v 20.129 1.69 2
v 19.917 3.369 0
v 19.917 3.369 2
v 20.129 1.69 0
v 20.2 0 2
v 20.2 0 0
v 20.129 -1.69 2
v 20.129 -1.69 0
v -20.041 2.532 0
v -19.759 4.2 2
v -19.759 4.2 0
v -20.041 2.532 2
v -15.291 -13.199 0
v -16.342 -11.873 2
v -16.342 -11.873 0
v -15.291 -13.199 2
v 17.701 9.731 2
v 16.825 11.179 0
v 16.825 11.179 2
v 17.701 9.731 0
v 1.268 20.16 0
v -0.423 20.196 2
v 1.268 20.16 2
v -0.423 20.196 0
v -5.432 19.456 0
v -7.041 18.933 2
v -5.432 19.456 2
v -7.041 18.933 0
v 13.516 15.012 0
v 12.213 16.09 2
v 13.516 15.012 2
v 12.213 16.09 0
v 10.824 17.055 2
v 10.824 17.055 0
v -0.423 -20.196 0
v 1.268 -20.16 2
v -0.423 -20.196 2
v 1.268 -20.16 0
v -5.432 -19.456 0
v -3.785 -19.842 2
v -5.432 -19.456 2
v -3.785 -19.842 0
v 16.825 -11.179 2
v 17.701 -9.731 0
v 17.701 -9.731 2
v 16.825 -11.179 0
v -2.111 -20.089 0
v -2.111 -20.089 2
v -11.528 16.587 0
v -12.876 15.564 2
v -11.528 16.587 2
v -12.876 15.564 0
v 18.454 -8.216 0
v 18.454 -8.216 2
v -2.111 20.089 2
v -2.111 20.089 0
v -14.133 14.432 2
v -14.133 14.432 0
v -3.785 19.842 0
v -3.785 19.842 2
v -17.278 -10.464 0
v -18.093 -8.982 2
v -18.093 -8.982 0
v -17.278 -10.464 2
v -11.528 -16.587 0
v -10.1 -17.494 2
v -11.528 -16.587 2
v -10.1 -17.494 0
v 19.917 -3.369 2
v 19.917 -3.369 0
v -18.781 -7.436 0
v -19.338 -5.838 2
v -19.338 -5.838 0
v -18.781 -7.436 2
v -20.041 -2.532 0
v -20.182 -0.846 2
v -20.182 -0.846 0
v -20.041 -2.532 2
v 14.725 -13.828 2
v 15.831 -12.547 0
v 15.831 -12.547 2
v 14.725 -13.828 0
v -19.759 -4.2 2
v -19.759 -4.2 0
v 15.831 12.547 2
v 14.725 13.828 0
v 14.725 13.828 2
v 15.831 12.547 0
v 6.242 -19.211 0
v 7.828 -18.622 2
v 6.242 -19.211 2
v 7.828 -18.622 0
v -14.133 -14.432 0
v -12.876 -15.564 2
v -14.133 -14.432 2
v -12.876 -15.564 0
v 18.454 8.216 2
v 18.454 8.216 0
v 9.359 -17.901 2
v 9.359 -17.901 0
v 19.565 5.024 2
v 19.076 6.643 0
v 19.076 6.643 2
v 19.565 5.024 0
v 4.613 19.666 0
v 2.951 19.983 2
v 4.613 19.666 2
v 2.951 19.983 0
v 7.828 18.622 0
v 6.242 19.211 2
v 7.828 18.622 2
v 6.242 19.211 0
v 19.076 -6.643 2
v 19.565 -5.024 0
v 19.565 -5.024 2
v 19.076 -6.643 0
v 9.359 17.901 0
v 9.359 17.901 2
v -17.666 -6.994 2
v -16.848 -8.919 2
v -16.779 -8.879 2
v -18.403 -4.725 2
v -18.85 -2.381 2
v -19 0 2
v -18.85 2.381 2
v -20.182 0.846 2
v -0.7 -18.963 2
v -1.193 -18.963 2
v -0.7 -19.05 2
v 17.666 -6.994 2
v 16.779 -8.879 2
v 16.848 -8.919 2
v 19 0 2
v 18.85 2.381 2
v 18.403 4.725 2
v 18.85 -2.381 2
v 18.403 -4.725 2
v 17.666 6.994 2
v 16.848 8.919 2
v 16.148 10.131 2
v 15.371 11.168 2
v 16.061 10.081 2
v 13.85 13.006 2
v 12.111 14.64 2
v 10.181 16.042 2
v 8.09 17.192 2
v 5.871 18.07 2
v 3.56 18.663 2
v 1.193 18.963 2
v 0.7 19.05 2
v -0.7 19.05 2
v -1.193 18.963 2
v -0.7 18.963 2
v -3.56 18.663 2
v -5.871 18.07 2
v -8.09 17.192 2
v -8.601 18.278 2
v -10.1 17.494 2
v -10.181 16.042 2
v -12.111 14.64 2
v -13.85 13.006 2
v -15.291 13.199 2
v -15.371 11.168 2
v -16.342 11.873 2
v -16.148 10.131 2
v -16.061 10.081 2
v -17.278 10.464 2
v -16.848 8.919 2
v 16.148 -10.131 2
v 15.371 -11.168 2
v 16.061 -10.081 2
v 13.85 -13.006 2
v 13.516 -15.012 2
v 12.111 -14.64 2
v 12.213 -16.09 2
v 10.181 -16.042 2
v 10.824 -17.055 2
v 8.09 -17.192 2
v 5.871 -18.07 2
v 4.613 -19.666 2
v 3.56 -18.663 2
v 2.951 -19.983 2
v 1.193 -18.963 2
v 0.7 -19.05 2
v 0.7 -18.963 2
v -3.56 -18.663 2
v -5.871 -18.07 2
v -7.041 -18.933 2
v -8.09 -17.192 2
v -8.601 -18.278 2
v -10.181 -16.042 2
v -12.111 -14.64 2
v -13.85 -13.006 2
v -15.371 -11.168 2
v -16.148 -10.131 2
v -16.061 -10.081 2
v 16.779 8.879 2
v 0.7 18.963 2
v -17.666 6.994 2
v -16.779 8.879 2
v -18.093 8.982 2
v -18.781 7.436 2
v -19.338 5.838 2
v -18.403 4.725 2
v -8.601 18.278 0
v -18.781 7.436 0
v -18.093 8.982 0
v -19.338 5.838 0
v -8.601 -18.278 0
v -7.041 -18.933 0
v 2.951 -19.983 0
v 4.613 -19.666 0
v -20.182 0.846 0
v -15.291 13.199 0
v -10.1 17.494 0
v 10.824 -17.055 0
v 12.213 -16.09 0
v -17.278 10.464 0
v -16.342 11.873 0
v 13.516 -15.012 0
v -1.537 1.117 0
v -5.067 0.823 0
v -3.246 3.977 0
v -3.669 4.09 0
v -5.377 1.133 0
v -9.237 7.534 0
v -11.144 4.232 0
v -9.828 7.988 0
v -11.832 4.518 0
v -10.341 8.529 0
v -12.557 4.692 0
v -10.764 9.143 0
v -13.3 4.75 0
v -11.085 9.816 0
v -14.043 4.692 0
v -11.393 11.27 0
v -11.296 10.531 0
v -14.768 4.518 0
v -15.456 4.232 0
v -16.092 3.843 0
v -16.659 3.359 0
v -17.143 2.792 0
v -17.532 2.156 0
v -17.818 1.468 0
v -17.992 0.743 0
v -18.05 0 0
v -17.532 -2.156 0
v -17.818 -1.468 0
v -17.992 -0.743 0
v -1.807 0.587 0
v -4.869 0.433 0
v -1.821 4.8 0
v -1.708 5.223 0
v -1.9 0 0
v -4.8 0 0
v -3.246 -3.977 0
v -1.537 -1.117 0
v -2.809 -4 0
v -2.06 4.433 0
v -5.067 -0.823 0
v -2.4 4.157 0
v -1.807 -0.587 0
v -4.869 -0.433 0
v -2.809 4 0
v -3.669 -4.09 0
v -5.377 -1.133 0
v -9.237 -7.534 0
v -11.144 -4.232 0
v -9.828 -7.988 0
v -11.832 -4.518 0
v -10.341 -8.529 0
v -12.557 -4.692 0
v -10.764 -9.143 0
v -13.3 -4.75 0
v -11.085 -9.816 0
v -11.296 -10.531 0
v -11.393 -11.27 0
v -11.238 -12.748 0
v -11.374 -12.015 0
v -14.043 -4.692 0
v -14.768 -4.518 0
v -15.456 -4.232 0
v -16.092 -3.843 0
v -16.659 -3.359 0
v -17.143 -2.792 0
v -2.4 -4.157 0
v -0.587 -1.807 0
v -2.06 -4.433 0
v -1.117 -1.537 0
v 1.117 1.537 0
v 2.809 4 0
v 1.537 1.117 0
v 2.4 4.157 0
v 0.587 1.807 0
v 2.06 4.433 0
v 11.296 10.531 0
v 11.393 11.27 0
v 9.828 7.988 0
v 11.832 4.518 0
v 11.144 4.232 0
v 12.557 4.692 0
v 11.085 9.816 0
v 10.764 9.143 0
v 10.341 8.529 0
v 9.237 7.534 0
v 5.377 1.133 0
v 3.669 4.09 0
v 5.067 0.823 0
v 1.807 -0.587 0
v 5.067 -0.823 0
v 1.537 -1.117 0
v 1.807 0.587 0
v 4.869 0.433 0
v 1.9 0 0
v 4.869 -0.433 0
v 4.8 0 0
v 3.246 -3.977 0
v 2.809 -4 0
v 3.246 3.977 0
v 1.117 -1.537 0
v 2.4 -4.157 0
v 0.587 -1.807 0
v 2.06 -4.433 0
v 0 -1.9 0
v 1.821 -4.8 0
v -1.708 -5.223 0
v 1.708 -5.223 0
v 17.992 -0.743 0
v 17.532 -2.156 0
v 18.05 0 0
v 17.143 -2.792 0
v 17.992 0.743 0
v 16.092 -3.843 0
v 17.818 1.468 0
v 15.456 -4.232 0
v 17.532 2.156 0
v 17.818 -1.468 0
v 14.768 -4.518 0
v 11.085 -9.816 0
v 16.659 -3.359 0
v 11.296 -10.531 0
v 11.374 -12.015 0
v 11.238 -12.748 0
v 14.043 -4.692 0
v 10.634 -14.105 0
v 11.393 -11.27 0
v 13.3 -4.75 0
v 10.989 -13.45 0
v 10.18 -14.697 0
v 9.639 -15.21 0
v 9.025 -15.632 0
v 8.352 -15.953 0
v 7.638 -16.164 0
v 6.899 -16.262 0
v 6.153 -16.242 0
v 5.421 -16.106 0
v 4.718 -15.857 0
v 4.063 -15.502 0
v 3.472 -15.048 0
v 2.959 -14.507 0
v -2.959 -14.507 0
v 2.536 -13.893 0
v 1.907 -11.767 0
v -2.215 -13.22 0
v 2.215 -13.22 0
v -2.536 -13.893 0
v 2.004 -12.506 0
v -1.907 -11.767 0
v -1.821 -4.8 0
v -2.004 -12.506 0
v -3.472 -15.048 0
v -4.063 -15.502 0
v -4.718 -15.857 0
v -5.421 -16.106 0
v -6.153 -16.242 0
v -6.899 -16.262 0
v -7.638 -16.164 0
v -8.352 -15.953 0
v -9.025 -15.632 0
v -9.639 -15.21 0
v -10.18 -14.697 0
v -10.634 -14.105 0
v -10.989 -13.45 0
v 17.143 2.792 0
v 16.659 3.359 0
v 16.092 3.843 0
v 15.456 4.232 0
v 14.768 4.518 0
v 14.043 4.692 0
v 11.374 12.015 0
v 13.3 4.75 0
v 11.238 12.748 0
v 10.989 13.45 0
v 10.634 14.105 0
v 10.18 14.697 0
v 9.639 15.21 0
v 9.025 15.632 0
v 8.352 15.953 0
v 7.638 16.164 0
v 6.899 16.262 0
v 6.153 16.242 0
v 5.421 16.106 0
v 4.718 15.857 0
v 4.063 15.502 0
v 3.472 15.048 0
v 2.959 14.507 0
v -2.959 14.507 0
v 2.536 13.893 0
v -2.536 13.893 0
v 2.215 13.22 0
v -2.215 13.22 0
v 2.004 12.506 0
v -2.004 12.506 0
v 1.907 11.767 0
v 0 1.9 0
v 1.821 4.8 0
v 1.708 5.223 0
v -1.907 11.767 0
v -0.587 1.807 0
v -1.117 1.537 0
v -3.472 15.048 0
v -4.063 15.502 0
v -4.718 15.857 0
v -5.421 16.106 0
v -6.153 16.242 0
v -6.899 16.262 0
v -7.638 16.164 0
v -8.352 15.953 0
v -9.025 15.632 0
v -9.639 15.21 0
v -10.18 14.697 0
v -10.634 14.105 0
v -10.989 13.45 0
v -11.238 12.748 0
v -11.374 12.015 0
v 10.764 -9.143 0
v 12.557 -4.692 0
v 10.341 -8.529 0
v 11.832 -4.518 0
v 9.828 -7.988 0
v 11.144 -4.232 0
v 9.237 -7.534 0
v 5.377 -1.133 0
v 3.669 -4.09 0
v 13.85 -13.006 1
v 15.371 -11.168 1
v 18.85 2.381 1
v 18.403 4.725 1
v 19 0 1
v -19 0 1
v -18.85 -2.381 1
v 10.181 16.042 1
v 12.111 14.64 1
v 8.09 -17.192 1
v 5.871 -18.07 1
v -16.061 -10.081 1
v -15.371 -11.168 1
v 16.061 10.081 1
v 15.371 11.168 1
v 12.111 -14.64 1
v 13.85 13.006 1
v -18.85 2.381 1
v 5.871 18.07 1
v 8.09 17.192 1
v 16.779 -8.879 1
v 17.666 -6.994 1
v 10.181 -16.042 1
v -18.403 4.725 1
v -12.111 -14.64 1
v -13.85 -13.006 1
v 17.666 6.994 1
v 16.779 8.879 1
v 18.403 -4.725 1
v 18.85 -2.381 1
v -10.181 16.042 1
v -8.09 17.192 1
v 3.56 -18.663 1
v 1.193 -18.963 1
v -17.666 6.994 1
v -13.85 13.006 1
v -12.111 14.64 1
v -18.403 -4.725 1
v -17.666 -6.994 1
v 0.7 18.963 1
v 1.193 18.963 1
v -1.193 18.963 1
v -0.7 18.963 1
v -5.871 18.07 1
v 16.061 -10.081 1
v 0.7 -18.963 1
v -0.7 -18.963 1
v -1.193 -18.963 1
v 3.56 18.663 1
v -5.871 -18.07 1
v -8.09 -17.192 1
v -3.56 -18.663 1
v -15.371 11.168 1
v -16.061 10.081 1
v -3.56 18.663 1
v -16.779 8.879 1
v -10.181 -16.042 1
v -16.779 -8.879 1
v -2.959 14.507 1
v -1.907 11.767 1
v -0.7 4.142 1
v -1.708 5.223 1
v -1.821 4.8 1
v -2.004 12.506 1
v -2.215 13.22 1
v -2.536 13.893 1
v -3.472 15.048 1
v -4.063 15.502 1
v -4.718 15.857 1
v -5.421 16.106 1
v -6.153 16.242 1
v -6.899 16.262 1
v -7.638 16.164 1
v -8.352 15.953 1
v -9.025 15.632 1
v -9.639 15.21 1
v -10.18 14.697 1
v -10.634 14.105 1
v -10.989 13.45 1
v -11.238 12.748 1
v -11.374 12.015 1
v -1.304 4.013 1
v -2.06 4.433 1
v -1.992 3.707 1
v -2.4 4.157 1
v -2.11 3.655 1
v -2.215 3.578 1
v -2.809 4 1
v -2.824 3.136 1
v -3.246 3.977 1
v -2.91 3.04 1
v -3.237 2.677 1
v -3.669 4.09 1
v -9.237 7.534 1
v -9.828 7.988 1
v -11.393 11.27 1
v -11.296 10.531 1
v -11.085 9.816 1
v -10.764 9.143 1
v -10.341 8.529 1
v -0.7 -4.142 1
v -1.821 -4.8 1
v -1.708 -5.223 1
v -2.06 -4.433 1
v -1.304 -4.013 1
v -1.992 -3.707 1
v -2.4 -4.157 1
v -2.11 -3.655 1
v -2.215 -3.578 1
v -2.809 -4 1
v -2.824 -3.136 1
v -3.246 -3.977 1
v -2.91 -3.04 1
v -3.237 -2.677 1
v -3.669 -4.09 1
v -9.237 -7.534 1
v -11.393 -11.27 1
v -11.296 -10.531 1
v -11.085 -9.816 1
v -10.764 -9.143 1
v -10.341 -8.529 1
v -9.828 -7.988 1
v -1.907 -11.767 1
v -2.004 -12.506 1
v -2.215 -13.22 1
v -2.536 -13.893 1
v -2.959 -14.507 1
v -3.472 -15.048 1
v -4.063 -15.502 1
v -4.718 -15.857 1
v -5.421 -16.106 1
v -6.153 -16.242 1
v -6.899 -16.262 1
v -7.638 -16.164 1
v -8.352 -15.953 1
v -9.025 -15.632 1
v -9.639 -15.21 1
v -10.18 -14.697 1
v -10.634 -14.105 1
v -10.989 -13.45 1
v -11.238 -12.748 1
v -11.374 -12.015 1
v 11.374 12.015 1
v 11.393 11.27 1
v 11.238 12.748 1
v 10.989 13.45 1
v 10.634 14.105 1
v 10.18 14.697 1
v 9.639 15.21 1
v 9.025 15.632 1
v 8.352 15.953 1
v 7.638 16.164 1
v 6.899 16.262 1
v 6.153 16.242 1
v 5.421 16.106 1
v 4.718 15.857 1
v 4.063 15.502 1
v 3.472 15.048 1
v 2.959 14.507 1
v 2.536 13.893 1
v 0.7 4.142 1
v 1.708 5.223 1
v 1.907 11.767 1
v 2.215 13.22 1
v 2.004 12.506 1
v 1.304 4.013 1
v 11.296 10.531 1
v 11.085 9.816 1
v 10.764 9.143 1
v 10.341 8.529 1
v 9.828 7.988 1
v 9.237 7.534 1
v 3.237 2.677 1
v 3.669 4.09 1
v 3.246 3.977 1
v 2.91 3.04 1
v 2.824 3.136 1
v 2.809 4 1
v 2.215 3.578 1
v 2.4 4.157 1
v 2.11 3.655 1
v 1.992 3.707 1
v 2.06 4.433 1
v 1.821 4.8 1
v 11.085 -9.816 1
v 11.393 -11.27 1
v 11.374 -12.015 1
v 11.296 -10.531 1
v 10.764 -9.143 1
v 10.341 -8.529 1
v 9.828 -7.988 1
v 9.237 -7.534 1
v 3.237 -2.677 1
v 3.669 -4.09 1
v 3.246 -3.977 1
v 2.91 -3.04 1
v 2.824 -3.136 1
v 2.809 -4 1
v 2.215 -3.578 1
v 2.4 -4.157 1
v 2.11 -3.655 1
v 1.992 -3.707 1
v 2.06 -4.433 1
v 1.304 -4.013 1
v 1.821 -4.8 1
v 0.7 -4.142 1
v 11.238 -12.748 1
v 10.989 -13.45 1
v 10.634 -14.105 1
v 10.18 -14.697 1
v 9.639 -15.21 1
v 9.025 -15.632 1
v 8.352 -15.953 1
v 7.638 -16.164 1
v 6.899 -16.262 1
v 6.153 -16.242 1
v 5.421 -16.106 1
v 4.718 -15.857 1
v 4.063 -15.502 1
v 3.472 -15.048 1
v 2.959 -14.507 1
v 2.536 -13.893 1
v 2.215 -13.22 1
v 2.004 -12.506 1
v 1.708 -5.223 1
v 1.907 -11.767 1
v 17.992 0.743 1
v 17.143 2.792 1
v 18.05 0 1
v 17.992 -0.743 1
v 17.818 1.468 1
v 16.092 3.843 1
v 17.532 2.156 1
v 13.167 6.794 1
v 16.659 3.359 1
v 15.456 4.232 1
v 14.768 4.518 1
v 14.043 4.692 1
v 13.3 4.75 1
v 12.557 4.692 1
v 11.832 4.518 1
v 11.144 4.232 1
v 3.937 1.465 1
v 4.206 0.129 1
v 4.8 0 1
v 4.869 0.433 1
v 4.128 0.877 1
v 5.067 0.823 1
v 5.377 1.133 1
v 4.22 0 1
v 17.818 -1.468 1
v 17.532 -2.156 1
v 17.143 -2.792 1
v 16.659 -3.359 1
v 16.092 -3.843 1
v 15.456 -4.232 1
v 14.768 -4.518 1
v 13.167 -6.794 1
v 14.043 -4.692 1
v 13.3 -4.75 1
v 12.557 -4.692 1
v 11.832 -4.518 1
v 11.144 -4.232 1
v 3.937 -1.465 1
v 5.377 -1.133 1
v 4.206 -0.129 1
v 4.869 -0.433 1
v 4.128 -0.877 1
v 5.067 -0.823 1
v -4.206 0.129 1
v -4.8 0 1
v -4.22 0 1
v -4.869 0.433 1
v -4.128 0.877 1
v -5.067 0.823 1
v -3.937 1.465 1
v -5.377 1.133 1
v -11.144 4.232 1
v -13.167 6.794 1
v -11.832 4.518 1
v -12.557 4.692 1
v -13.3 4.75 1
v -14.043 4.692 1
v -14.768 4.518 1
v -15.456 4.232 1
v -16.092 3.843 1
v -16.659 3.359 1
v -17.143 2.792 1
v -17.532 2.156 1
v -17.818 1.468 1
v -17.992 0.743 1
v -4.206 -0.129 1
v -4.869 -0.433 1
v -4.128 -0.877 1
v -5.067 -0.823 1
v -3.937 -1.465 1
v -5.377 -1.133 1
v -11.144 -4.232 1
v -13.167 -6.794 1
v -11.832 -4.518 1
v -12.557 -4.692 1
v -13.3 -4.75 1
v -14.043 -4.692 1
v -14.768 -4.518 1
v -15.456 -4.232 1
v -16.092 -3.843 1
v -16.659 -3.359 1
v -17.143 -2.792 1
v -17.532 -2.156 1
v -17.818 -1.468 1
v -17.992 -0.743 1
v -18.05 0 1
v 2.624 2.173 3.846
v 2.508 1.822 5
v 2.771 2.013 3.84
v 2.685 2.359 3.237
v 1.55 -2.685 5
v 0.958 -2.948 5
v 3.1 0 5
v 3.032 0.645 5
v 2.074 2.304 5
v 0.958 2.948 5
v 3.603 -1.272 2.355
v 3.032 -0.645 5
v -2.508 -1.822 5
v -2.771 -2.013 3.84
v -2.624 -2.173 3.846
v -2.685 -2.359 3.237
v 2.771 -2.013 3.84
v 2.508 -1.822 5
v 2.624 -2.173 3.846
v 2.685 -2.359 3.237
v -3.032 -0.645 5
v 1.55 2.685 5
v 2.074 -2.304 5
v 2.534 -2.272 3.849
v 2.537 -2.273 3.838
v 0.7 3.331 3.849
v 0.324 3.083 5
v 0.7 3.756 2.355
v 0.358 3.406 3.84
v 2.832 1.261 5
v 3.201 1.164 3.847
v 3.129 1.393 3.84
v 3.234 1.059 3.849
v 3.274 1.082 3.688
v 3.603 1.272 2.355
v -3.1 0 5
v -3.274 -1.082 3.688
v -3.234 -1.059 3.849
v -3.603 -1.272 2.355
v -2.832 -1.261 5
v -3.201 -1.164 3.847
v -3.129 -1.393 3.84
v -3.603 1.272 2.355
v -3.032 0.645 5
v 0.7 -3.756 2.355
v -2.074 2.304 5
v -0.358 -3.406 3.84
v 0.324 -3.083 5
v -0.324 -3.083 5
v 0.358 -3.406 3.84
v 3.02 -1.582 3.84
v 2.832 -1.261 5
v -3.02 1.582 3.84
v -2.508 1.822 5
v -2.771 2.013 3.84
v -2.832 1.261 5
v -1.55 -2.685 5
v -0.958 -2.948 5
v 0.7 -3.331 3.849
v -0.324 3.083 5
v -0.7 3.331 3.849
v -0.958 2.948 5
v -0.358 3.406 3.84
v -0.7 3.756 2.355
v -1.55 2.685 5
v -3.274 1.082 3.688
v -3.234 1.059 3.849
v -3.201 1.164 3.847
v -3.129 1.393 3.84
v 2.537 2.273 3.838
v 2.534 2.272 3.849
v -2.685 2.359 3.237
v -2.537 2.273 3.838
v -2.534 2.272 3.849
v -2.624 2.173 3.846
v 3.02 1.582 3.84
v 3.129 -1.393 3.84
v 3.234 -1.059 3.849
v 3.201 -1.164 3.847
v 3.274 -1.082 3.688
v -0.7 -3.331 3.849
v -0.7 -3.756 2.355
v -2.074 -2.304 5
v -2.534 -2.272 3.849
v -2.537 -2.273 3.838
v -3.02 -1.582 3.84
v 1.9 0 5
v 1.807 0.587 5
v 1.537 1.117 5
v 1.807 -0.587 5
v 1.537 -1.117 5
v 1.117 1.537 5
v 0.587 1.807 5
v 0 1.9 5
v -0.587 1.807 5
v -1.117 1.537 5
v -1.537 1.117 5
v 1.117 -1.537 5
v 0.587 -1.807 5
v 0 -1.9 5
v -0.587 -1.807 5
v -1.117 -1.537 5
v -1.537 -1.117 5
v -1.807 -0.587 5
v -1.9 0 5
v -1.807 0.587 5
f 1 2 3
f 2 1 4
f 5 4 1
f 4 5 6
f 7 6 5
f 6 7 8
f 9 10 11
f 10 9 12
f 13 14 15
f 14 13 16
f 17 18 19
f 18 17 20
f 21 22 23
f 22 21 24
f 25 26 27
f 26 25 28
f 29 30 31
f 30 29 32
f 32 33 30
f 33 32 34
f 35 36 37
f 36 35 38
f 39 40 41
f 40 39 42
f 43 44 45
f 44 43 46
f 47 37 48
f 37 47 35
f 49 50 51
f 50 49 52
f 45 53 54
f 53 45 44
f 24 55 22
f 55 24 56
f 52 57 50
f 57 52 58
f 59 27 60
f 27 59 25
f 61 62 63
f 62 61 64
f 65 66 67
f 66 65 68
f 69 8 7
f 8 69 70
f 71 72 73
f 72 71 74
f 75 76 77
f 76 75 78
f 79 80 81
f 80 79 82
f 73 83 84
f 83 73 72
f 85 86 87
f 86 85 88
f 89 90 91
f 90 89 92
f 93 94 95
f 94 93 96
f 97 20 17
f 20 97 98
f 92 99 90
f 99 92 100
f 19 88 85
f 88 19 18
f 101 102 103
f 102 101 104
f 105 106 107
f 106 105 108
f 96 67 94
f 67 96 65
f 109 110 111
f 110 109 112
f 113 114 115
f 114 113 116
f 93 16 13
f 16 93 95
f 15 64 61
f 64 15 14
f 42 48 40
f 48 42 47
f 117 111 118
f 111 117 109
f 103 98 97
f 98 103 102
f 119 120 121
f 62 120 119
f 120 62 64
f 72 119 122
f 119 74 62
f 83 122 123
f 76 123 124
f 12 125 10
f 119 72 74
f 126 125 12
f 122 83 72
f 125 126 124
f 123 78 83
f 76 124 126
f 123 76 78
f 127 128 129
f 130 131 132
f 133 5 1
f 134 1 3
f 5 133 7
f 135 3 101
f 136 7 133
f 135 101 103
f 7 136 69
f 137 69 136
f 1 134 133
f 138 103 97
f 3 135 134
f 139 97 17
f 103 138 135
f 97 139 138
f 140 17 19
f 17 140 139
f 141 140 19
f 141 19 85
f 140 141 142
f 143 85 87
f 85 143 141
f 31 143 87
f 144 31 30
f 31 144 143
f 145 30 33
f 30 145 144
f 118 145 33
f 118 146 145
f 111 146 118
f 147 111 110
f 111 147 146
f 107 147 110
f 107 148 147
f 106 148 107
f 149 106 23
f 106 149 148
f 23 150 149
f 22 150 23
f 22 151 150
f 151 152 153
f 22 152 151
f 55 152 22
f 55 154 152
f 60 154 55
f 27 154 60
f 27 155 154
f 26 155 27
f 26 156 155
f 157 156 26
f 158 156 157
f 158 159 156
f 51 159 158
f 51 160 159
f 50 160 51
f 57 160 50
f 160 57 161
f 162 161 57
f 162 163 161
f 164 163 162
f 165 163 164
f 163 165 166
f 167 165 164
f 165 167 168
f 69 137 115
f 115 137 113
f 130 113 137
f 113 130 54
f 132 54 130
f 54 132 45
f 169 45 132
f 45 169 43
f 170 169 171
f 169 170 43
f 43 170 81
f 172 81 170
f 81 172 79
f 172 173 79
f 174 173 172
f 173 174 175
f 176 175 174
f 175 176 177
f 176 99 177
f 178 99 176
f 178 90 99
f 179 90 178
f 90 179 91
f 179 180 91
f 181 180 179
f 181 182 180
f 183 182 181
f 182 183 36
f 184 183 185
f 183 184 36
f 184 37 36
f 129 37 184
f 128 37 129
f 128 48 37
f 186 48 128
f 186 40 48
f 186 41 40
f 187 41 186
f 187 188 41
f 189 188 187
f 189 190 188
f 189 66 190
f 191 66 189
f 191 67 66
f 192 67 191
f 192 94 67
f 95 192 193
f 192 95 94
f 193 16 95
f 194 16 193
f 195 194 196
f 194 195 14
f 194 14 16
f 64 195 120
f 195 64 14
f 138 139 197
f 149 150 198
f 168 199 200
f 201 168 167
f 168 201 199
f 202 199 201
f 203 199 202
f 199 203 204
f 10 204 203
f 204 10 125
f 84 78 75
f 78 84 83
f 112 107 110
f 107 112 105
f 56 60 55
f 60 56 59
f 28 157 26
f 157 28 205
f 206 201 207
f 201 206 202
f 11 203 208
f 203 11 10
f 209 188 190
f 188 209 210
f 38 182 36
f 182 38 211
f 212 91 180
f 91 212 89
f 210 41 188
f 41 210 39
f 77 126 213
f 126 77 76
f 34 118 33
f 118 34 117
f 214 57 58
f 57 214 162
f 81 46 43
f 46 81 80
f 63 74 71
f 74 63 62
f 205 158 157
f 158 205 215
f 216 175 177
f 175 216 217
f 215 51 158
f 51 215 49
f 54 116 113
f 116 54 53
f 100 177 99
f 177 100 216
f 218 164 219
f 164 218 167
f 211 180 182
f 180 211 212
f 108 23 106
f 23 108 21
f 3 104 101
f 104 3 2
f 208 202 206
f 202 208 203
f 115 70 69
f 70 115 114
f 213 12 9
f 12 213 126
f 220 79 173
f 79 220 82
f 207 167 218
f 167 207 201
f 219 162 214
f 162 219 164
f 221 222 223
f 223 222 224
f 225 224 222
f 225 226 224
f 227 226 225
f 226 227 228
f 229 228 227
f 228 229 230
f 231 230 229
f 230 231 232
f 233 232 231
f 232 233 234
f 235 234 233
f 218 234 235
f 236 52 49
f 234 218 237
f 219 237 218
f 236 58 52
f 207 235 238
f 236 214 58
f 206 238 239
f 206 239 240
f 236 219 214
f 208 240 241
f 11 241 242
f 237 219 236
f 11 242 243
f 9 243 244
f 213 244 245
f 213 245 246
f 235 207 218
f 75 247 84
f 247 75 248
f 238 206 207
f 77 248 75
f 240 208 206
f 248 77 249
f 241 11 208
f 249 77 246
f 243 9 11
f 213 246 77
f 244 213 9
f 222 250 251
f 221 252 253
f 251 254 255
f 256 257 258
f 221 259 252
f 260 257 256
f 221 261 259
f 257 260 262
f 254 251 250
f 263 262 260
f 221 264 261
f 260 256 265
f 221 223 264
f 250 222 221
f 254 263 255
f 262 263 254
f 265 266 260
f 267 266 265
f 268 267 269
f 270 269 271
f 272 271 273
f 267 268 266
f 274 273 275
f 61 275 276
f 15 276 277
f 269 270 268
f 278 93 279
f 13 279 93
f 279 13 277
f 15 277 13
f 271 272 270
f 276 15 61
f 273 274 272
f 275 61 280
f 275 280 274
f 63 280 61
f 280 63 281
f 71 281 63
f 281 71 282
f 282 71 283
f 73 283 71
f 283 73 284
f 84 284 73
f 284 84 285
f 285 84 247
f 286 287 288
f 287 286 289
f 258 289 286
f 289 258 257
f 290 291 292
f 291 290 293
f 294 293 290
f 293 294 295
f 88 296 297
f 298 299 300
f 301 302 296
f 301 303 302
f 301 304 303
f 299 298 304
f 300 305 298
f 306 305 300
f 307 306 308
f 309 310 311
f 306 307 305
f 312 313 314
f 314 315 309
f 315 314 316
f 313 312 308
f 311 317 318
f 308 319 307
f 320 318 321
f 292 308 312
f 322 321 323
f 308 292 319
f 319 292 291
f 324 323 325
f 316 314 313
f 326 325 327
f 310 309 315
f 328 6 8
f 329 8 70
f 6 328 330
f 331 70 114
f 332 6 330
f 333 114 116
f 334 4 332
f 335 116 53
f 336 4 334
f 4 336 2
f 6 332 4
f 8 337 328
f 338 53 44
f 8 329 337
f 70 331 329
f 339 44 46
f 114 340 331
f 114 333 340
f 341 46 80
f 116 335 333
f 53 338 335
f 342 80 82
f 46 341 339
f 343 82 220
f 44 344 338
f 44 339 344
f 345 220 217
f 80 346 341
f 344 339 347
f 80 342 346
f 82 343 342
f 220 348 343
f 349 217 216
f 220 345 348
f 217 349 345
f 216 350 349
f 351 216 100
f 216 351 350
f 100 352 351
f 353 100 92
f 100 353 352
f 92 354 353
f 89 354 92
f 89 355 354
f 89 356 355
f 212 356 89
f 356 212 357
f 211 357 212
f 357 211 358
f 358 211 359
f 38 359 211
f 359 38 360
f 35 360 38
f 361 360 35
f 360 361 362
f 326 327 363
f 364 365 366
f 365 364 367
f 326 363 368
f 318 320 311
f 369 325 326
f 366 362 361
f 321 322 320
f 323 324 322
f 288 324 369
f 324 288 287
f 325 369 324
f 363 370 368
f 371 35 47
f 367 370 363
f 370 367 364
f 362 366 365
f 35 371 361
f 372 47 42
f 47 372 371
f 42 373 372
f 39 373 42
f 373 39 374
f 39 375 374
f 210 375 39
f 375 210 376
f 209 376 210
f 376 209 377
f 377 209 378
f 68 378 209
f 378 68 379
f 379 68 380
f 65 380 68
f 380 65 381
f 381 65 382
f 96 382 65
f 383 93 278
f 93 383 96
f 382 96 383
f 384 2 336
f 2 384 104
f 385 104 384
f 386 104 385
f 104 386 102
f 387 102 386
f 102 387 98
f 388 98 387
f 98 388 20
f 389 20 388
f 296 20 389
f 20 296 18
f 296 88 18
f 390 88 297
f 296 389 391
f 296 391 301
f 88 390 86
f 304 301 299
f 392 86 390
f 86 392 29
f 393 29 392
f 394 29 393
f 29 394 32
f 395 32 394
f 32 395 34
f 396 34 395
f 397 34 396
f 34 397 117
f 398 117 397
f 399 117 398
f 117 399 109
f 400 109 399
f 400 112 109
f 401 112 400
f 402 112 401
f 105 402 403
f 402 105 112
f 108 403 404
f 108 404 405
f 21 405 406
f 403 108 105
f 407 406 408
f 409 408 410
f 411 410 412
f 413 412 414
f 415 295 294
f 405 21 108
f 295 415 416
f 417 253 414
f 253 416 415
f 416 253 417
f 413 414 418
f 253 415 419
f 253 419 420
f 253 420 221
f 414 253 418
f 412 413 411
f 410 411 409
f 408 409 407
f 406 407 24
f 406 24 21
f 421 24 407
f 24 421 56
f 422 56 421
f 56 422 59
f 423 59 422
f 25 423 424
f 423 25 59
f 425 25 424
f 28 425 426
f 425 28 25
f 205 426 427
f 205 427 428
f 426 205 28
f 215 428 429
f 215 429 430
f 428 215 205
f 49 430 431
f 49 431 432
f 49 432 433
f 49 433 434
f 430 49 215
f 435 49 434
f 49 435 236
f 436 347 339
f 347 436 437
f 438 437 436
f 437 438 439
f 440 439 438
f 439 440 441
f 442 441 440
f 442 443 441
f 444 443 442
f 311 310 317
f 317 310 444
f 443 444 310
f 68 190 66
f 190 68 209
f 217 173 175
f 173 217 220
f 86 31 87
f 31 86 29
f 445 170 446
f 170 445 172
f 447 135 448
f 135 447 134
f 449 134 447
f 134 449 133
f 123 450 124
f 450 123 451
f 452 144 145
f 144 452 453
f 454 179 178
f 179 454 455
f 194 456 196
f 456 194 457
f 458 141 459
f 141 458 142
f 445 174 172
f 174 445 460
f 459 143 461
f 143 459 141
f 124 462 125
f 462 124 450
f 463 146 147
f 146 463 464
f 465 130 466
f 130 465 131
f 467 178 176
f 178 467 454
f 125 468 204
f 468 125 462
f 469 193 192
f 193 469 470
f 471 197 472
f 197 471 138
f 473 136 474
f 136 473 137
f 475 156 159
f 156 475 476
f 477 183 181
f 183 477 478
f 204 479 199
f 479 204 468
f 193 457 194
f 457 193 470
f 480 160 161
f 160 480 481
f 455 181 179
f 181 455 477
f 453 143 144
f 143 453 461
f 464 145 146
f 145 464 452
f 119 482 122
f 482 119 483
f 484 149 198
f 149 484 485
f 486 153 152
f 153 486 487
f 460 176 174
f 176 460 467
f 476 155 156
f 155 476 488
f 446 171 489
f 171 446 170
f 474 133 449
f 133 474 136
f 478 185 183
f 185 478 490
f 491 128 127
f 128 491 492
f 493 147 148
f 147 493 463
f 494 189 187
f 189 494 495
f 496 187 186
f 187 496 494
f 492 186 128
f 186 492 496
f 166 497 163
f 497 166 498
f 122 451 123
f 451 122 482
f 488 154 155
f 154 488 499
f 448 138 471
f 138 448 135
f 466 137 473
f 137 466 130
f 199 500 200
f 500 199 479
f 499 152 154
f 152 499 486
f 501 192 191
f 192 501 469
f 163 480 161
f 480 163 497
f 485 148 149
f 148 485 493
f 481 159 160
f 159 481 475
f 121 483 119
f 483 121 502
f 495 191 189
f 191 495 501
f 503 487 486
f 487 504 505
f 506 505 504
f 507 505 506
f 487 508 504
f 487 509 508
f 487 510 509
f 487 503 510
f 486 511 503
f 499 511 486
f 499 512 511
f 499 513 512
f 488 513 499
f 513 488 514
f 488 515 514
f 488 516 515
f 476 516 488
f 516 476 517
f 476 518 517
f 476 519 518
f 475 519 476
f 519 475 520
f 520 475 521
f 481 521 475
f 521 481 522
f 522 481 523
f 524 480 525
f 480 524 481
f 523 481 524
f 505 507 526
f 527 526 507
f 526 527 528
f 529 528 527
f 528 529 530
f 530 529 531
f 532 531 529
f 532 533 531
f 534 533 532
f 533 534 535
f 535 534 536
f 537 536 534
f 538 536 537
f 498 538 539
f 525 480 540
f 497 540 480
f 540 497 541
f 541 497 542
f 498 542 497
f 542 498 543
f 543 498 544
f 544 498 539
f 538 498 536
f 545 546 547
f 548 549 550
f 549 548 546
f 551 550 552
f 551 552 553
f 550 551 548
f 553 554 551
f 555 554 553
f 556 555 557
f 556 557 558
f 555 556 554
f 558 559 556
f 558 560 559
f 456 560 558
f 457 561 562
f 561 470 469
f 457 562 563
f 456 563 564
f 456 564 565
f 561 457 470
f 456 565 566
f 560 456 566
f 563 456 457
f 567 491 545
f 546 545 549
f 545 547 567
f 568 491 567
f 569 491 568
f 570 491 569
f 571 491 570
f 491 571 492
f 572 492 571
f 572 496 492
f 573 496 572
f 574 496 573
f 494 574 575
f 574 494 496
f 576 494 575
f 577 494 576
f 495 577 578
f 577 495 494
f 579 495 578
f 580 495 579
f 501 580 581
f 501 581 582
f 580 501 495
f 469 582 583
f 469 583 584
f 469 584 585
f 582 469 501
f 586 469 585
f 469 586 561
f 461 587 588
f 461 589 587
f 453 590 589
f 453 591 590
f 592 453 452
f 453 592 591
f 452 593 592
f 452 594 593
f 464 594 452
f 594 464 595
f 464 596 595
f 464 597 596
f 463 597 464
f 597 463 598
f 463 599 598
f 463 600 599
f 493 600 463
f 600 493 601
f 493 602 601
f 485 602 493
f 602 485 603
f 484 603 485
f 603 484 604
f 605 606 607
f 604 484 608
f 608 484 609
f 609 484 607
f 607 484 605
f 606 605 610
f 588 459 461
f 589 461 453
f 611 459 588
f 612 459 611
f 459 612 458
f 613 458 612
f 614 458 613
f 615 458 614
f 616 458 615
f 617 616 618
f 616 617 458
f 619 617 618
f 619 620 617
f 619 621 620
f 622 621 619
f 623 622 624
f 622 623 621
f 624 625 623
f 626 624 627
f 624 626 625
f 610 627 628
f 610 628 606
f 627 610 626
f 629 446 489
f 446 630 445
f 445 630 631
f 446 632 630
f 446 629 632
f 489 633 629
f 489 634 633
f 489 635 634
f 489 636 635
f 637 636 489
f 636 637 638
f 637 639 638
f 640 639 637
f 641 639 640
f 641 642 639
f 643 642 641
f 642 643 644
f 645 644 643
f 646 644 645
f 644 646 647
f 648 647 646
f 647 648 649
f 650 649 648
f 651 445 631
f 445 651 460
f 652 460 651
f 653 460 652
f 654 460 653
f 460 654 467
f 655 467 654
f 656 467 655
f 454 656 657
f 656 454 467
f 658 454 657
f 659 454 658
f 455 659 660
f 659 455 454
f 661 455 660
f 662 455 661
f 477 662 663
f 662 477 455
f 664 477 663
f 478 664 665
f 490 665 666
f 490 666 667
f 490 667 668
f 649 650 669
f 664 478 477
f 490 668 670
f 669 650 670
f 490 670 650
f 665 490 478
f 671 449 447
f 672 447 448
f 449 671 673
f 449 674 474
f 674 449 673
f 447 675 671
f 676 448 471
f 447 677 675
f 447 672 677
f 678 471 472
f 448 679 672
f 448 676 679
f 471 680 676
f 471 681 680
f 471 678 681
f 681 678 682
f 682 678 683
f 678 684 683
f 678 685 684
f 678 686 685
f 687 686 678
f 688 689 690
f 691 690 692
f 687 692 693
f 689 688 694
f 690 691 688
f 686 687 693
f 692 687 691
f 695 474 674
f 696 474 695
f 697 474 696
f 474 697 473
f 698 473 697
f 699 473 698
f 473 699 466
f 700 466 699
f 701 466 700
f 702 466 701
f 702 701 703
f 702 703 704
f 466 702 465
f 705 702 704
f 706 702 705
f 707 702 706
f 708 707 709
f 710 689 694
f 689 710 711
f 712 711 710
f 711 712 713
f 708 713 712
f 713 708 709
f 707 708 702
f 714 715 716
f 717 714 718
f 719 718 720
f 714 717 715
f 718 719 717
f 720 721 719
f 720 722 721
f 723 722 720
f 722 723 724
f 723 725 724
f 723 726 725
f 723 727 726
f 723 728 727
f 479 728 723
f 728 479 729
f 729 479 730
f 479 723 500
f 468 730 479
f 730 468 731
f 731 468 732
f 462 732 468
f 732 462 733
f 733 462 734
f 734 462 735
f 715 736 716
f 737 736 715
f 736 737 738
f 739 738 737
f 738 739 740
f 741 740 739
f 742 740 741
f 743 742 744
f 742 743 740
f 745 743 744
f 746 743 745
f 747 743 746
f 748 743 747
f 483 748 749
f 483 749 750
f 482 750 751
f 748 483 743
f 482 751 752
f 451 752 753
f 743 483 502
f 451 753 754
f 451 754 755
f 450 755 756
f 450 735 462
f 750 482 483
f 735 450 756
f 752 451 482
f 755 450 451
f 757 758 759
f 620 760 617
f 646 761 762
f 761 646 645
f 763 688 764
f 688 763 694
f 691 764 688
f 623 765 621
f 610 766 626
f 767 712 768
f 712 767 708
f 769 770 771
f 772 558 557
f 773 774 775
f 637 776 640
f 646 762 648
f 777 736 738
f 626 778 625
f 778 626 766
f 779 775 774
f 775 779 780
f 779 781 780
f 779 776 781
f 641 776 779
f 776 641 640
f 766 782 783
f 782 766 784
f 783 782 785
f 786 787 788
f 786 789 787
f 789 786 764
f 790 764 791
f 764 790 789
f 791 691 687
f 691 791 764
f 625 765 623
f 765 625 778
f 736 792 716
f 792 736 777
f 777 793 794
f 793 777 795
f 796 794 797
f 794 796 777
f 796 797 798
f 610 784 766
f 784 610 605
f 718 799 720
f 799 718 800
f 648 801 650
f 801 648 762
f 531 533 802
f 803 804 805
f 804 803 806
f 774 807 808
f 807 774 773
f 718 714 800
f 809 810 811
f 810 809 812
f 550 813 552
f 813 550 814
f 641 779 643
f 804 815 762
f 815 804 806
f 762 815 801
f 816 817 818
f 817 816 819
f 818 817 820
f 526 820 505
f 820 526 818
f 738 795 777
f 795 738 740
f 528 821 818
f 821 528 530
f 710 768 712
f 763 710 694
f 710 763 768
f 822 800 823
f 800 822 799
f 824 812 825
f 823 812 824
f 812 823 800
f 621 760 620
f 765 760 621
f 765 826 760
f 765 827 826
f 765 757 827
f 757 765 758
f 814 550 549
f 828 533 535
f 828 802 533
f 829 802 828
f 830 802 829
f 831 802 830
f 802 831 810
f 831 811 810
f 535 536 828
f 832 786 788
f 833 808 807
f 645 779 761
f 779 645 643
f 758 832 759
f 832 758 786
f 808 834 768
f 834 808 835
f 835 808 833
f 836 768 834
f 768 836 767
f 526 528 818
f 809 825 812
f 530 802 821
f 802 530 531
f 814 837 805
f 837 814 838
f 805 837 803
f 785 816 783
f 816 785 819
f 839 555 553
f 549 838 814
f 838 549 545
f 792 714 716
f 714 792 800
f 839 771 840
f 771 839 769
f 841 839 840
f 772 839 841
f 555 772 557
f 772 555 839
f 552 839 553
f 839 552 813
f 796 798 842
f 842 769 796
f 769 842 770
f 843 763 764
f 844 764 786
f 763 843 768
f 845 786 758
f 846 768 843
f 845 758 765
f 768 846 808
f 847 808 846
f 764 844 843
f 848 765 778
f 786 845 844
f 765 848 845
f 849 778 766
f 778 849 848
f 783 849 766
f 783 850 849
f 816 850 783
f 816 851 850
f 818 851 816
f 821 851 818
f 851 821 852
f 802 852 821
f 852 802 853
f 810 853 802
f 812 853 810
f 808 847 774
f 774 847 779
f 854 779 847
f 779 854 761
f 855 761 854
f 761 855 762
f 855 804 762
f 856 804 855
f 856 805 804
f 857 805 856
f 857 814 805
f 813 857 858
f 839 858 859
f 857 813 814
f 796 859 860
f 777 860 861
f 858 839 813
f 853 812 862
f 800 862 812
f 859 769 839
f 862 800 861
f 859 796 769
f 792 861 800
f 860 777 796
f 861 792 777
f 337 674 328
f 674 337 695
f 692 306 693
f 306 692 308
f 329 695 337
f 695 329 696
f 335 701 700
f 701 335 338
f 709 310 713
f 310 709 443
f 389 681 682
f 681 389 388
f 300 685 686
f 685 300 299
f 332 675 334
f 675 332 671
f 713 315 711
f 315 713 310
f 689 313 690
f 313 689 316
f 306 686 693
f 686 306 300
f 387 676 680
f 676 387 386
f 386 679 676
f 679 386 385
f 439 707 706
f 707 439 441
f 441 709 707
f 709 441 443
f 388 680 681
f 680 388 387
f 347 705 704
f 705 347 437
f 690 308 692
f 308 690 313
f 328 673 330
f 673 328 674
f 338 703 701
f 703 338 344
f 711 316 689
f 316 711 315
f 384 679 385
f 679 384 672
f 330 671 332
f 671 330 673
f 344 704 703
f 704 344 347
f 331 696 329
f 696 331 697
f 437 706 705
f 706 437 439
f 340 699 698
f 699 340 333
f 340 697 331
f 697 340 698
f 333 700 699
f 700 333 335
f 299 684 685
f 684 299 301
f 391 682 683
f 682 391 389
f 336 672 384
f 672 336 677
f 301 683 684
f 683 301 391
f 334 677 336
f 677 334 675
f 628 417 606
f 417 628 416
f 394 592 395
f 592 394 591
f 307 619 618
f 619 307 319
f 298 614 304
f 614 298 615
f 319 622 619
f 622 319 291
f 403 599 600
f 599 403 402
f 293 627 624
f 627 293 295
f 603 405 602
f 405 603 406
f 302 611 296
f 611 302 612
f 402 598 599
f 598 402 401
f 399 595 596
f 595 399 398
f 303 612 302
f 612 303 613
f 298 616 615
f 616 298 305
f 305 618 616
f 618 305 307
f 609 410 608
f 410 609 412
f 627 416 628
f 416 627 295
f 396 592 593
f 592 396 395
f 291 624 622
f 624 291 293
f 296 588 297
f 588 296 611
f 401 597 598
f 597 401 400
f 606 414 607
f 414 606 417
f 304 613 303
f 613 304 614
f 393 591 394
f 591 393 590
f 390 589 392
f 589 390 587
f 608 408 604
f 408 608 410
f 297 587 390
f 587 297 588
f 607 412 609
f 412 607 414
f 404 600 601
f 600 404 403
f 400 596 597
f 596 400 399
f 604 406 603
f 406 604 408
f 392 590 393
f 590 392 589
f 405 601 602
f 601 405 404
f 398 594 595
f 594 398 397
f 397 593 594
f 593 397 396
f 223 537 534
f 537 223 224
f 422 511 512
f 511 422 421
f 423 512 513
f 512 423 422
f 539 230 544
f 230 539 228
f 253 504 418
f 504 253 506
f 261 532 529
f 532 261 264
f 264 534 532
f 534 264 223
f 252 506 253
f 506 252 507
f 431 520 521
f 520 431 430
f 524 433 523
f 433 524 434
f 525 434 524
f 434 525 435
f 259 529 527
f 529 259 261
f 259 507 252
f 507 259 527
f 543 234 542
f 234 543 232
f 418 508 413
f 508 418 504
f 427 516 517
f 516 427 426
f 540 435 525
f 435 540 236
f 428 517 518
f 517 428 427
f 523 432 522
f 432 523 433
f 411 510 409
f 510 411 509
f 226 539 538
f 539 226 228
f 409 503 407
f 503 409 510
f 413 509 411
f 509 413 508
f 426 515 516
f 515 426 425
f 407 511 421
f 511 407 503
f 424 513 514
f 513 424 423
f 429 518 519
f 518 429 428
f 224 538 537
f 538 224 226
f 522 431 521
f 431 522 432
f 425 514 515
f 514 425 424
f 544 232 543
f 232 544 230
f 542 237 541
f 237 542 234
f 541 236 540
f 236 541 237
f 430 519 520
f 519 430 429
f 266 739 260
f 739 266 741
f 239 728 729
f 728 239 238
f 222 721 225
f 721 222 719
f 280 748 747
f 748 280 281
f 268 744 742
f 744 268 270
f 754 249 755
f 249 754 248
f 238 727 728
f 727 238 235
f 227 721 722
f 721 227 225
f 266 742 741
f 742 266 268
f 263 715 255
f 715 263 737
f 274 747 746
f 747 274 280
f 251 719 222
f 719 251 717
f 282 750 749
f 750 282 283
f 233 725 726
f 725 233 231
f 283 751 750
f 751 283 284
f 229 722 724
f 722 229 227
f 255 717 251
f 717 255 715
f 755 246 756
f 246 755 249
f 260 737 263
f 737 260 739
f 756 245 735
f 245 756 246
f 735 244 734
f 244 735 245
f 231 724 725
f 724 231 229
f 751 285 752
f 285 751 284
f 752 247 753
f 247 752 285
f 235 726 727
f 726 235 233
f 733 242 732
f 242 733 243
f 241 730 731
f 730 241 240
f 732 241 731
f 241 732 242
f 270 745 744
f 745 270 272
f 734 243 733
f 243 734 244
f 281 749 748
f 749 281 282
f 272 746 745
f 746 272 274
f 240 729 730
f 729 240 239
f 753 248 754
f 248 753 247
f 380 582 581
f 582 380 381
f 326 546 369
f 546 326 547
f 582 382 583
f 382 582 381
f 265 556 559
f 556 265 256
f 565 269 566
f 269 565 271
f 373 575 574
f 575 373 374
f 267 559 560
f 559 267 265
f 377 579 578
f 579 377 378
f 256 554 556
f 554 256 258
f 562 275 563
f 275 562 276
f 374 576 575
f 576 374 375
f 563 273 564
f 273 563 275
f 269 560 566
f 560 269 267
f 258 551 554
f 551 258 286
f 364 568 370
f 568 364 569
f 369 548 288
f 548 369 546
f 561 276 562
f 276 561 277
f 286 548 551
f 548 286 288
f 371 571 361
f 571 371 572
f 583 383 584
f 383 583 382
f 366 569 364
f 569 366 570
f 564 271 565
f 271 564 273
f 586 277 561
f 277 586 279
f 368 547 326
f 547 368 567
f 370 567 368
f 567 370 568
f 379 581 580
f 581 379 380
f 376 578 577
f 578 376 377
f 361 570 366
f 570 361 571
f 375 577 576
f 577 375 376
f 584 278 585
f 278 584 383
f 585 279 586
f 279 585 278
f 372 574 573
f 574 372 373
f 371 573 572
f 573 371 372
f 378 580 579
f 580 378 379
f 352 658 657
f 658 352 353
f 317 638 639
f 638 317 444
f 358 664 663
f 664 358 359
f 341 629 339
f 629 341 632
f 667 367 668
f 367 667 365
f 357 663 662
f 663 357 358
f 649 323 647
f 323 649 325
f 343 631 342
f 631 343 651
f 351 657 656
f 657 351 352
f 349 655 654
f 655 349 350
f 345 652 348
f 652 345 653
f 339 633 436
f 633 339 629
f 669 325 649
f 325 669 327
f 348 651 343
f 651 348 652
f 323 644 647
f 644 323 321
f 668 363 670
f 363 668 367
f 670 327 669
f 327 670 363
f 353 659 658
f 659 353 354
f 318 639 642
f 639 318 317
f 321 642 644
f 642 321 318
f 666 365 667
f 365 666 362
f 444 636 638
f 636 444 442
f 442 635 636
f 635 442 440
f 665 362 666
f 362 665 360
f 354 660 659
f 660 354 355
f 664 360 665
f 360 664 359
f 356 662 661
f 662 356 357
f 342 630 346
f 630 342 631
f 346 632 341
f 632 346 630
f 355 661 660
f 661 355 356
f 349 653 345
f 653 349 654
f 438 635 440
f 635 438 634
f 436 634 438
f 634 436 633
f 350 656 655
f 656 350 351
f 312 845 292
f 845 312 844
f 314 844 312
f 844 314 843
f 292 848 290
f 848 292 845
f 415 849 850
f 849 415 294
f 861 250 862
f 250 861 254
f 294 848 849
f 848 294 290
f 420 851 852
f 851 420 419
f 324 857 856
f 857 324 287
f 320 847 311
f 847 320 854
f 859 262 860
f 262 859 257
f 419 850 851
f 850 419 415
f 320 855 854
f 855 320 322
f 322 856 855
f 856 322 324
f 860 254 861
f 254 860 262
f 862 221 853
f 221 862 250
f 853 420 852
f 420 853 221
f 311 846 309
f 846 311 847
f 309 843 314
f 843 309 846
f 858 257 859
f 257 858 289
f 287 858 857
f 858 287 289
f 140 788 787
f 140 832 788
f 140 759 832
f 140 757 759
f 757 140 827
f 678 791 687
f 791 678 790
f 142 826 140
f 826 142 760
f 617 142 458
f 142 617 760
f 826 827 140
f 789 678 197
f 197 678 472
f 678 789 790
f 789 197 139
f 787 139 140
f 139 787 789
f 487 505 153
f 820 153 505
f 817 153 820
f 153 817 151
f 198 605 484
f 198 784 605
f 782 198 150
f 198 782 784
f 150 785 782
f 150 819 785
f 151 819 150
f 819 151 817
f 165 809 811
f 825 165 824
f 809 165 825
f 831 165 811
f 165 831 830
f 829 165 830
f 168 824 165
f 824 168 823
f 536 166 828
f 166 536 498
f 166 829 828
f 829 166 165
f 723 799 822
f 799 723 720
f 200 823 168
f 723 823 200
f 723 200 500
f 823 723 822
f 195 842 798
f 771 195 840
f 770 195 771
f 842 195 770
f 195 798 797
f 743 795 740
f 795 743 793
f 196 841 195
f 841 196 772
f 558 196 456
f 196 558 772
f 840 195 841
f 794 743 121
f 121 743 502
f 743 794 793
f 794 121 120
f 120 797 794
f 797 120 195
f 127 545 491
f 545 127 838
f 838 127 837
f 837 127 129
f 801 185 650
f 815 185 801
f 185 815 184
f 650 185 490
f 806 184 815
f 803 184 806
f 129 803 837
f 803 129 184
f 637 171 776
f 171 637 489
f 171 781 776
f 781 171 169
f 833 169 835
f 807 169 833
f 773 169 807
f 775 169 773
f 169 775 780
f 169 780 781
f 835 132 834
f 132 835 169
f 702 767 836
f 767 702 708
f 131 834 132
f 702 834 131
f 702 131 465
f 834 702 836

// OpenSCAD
//***** Shockflyer Wheel ******
//*    Henning Stöcklein              *
//*  Free for noncommercial use   *
//*  Version 27.8.2016                *
//*************************

// Axis hole diameter
dwelle = 3.8; // [2.0:0.1:4.0]

// Wheel disc thickness
dicke = 1.0; // [0.8:0.1:2.0]

// Wheel disc diameter (default = 38)
diam  = 38; // [25:45]

// Tire radius 
rkragen = 1.2; // [0.8:0.1:2.5]

// Tire height
hkragen = 1; // [0.8:0.1:2.5]

// Center hub height
hnabe = 5; // [1:0.2:6]

// Center hub diameter
dnabe = 9; // [5:12]

// Spoke height
hspeiche = 3 ; // [1:0.1:5]

// Show Spacer?
showspacer = 0 ; // [1:YES, 0:NO]

// Spacer height
hspacer = 3 ; // [1:0.1:4]

// Spacer hole diameter
dspacer = 3.6; // [2.0:0.1:4.0]


//*********** End of user parameters *************

module wheel ()
{
  difference() {
    union() {
	   // Scheibe und Nabe
       translate ([0,0,dicke/2]) cylinder (r=diam/2, h=dicke, $fn=50, center=true);
   	   translate ([0,0,hnabe/2]) cylinder (r1=dnabe/2, r2=dwelle/2+1.2, h=hnabe, $fn=30, center=true);

	   // Kragen aussenherum = Lauffläche
		difference ()
        {
     	  translate ([0,0,(dicke+hkragen)/2]) 
              cylinder (r=diam/2+rkragen, h=dicke+hkragen, $fn=75, center=true);
          cylinder (r=diam/2, h=20, $fn=50, center=true);
      } // diff
    } // union

    // Loch in der Nabe
    cylinder (r=dwelle/2, h=20, $fn=20, center=true);

    // 6 Aussparungen zwischen den Speichen
    for (x = [0:60:360]) {
      rotate ([0,0,x]) hull()
      {
          translate ([diam*0.35,0,0]) cylinder (r=diam/8, h=20, $fn=40, center=true);
          translate ([6.2,0,0]) cylinder (r=1.4, h=20, $fn=20, center=true);
      }
    }
  }

  // 6 Versteifungsrippen zwischen Nabe und Speichen
  for (x = [30:60:390])
  {
	   rotate ([0,0,x]) hull()
       {
           translate ([dwelle/2+0.1,0,(dicke+hspeiche)/2]) cube ([0.1, 1.4, dicke+hspeiche], center=true);
           translate ([diam/2,0,(dicke+hkragen)/2]) cube ([0.1, 1.4, dicke+hkragen], center=true);
       }
  } // for
} // module wheel

// Distanzröllchen
module spacer()
{
  translate ([0,0,hspacer/2]) 
    difference()
    {
      cylinder (r=0.7*dnabe/2, h=hspacer, $fn=30, center=true);
      cylinder (r=dspacer/2, h=20, $fn=20, center=true);
    }
}

wheel() ;

if (showspacer == 1) translate ([25,25,0]) spacer() ;
